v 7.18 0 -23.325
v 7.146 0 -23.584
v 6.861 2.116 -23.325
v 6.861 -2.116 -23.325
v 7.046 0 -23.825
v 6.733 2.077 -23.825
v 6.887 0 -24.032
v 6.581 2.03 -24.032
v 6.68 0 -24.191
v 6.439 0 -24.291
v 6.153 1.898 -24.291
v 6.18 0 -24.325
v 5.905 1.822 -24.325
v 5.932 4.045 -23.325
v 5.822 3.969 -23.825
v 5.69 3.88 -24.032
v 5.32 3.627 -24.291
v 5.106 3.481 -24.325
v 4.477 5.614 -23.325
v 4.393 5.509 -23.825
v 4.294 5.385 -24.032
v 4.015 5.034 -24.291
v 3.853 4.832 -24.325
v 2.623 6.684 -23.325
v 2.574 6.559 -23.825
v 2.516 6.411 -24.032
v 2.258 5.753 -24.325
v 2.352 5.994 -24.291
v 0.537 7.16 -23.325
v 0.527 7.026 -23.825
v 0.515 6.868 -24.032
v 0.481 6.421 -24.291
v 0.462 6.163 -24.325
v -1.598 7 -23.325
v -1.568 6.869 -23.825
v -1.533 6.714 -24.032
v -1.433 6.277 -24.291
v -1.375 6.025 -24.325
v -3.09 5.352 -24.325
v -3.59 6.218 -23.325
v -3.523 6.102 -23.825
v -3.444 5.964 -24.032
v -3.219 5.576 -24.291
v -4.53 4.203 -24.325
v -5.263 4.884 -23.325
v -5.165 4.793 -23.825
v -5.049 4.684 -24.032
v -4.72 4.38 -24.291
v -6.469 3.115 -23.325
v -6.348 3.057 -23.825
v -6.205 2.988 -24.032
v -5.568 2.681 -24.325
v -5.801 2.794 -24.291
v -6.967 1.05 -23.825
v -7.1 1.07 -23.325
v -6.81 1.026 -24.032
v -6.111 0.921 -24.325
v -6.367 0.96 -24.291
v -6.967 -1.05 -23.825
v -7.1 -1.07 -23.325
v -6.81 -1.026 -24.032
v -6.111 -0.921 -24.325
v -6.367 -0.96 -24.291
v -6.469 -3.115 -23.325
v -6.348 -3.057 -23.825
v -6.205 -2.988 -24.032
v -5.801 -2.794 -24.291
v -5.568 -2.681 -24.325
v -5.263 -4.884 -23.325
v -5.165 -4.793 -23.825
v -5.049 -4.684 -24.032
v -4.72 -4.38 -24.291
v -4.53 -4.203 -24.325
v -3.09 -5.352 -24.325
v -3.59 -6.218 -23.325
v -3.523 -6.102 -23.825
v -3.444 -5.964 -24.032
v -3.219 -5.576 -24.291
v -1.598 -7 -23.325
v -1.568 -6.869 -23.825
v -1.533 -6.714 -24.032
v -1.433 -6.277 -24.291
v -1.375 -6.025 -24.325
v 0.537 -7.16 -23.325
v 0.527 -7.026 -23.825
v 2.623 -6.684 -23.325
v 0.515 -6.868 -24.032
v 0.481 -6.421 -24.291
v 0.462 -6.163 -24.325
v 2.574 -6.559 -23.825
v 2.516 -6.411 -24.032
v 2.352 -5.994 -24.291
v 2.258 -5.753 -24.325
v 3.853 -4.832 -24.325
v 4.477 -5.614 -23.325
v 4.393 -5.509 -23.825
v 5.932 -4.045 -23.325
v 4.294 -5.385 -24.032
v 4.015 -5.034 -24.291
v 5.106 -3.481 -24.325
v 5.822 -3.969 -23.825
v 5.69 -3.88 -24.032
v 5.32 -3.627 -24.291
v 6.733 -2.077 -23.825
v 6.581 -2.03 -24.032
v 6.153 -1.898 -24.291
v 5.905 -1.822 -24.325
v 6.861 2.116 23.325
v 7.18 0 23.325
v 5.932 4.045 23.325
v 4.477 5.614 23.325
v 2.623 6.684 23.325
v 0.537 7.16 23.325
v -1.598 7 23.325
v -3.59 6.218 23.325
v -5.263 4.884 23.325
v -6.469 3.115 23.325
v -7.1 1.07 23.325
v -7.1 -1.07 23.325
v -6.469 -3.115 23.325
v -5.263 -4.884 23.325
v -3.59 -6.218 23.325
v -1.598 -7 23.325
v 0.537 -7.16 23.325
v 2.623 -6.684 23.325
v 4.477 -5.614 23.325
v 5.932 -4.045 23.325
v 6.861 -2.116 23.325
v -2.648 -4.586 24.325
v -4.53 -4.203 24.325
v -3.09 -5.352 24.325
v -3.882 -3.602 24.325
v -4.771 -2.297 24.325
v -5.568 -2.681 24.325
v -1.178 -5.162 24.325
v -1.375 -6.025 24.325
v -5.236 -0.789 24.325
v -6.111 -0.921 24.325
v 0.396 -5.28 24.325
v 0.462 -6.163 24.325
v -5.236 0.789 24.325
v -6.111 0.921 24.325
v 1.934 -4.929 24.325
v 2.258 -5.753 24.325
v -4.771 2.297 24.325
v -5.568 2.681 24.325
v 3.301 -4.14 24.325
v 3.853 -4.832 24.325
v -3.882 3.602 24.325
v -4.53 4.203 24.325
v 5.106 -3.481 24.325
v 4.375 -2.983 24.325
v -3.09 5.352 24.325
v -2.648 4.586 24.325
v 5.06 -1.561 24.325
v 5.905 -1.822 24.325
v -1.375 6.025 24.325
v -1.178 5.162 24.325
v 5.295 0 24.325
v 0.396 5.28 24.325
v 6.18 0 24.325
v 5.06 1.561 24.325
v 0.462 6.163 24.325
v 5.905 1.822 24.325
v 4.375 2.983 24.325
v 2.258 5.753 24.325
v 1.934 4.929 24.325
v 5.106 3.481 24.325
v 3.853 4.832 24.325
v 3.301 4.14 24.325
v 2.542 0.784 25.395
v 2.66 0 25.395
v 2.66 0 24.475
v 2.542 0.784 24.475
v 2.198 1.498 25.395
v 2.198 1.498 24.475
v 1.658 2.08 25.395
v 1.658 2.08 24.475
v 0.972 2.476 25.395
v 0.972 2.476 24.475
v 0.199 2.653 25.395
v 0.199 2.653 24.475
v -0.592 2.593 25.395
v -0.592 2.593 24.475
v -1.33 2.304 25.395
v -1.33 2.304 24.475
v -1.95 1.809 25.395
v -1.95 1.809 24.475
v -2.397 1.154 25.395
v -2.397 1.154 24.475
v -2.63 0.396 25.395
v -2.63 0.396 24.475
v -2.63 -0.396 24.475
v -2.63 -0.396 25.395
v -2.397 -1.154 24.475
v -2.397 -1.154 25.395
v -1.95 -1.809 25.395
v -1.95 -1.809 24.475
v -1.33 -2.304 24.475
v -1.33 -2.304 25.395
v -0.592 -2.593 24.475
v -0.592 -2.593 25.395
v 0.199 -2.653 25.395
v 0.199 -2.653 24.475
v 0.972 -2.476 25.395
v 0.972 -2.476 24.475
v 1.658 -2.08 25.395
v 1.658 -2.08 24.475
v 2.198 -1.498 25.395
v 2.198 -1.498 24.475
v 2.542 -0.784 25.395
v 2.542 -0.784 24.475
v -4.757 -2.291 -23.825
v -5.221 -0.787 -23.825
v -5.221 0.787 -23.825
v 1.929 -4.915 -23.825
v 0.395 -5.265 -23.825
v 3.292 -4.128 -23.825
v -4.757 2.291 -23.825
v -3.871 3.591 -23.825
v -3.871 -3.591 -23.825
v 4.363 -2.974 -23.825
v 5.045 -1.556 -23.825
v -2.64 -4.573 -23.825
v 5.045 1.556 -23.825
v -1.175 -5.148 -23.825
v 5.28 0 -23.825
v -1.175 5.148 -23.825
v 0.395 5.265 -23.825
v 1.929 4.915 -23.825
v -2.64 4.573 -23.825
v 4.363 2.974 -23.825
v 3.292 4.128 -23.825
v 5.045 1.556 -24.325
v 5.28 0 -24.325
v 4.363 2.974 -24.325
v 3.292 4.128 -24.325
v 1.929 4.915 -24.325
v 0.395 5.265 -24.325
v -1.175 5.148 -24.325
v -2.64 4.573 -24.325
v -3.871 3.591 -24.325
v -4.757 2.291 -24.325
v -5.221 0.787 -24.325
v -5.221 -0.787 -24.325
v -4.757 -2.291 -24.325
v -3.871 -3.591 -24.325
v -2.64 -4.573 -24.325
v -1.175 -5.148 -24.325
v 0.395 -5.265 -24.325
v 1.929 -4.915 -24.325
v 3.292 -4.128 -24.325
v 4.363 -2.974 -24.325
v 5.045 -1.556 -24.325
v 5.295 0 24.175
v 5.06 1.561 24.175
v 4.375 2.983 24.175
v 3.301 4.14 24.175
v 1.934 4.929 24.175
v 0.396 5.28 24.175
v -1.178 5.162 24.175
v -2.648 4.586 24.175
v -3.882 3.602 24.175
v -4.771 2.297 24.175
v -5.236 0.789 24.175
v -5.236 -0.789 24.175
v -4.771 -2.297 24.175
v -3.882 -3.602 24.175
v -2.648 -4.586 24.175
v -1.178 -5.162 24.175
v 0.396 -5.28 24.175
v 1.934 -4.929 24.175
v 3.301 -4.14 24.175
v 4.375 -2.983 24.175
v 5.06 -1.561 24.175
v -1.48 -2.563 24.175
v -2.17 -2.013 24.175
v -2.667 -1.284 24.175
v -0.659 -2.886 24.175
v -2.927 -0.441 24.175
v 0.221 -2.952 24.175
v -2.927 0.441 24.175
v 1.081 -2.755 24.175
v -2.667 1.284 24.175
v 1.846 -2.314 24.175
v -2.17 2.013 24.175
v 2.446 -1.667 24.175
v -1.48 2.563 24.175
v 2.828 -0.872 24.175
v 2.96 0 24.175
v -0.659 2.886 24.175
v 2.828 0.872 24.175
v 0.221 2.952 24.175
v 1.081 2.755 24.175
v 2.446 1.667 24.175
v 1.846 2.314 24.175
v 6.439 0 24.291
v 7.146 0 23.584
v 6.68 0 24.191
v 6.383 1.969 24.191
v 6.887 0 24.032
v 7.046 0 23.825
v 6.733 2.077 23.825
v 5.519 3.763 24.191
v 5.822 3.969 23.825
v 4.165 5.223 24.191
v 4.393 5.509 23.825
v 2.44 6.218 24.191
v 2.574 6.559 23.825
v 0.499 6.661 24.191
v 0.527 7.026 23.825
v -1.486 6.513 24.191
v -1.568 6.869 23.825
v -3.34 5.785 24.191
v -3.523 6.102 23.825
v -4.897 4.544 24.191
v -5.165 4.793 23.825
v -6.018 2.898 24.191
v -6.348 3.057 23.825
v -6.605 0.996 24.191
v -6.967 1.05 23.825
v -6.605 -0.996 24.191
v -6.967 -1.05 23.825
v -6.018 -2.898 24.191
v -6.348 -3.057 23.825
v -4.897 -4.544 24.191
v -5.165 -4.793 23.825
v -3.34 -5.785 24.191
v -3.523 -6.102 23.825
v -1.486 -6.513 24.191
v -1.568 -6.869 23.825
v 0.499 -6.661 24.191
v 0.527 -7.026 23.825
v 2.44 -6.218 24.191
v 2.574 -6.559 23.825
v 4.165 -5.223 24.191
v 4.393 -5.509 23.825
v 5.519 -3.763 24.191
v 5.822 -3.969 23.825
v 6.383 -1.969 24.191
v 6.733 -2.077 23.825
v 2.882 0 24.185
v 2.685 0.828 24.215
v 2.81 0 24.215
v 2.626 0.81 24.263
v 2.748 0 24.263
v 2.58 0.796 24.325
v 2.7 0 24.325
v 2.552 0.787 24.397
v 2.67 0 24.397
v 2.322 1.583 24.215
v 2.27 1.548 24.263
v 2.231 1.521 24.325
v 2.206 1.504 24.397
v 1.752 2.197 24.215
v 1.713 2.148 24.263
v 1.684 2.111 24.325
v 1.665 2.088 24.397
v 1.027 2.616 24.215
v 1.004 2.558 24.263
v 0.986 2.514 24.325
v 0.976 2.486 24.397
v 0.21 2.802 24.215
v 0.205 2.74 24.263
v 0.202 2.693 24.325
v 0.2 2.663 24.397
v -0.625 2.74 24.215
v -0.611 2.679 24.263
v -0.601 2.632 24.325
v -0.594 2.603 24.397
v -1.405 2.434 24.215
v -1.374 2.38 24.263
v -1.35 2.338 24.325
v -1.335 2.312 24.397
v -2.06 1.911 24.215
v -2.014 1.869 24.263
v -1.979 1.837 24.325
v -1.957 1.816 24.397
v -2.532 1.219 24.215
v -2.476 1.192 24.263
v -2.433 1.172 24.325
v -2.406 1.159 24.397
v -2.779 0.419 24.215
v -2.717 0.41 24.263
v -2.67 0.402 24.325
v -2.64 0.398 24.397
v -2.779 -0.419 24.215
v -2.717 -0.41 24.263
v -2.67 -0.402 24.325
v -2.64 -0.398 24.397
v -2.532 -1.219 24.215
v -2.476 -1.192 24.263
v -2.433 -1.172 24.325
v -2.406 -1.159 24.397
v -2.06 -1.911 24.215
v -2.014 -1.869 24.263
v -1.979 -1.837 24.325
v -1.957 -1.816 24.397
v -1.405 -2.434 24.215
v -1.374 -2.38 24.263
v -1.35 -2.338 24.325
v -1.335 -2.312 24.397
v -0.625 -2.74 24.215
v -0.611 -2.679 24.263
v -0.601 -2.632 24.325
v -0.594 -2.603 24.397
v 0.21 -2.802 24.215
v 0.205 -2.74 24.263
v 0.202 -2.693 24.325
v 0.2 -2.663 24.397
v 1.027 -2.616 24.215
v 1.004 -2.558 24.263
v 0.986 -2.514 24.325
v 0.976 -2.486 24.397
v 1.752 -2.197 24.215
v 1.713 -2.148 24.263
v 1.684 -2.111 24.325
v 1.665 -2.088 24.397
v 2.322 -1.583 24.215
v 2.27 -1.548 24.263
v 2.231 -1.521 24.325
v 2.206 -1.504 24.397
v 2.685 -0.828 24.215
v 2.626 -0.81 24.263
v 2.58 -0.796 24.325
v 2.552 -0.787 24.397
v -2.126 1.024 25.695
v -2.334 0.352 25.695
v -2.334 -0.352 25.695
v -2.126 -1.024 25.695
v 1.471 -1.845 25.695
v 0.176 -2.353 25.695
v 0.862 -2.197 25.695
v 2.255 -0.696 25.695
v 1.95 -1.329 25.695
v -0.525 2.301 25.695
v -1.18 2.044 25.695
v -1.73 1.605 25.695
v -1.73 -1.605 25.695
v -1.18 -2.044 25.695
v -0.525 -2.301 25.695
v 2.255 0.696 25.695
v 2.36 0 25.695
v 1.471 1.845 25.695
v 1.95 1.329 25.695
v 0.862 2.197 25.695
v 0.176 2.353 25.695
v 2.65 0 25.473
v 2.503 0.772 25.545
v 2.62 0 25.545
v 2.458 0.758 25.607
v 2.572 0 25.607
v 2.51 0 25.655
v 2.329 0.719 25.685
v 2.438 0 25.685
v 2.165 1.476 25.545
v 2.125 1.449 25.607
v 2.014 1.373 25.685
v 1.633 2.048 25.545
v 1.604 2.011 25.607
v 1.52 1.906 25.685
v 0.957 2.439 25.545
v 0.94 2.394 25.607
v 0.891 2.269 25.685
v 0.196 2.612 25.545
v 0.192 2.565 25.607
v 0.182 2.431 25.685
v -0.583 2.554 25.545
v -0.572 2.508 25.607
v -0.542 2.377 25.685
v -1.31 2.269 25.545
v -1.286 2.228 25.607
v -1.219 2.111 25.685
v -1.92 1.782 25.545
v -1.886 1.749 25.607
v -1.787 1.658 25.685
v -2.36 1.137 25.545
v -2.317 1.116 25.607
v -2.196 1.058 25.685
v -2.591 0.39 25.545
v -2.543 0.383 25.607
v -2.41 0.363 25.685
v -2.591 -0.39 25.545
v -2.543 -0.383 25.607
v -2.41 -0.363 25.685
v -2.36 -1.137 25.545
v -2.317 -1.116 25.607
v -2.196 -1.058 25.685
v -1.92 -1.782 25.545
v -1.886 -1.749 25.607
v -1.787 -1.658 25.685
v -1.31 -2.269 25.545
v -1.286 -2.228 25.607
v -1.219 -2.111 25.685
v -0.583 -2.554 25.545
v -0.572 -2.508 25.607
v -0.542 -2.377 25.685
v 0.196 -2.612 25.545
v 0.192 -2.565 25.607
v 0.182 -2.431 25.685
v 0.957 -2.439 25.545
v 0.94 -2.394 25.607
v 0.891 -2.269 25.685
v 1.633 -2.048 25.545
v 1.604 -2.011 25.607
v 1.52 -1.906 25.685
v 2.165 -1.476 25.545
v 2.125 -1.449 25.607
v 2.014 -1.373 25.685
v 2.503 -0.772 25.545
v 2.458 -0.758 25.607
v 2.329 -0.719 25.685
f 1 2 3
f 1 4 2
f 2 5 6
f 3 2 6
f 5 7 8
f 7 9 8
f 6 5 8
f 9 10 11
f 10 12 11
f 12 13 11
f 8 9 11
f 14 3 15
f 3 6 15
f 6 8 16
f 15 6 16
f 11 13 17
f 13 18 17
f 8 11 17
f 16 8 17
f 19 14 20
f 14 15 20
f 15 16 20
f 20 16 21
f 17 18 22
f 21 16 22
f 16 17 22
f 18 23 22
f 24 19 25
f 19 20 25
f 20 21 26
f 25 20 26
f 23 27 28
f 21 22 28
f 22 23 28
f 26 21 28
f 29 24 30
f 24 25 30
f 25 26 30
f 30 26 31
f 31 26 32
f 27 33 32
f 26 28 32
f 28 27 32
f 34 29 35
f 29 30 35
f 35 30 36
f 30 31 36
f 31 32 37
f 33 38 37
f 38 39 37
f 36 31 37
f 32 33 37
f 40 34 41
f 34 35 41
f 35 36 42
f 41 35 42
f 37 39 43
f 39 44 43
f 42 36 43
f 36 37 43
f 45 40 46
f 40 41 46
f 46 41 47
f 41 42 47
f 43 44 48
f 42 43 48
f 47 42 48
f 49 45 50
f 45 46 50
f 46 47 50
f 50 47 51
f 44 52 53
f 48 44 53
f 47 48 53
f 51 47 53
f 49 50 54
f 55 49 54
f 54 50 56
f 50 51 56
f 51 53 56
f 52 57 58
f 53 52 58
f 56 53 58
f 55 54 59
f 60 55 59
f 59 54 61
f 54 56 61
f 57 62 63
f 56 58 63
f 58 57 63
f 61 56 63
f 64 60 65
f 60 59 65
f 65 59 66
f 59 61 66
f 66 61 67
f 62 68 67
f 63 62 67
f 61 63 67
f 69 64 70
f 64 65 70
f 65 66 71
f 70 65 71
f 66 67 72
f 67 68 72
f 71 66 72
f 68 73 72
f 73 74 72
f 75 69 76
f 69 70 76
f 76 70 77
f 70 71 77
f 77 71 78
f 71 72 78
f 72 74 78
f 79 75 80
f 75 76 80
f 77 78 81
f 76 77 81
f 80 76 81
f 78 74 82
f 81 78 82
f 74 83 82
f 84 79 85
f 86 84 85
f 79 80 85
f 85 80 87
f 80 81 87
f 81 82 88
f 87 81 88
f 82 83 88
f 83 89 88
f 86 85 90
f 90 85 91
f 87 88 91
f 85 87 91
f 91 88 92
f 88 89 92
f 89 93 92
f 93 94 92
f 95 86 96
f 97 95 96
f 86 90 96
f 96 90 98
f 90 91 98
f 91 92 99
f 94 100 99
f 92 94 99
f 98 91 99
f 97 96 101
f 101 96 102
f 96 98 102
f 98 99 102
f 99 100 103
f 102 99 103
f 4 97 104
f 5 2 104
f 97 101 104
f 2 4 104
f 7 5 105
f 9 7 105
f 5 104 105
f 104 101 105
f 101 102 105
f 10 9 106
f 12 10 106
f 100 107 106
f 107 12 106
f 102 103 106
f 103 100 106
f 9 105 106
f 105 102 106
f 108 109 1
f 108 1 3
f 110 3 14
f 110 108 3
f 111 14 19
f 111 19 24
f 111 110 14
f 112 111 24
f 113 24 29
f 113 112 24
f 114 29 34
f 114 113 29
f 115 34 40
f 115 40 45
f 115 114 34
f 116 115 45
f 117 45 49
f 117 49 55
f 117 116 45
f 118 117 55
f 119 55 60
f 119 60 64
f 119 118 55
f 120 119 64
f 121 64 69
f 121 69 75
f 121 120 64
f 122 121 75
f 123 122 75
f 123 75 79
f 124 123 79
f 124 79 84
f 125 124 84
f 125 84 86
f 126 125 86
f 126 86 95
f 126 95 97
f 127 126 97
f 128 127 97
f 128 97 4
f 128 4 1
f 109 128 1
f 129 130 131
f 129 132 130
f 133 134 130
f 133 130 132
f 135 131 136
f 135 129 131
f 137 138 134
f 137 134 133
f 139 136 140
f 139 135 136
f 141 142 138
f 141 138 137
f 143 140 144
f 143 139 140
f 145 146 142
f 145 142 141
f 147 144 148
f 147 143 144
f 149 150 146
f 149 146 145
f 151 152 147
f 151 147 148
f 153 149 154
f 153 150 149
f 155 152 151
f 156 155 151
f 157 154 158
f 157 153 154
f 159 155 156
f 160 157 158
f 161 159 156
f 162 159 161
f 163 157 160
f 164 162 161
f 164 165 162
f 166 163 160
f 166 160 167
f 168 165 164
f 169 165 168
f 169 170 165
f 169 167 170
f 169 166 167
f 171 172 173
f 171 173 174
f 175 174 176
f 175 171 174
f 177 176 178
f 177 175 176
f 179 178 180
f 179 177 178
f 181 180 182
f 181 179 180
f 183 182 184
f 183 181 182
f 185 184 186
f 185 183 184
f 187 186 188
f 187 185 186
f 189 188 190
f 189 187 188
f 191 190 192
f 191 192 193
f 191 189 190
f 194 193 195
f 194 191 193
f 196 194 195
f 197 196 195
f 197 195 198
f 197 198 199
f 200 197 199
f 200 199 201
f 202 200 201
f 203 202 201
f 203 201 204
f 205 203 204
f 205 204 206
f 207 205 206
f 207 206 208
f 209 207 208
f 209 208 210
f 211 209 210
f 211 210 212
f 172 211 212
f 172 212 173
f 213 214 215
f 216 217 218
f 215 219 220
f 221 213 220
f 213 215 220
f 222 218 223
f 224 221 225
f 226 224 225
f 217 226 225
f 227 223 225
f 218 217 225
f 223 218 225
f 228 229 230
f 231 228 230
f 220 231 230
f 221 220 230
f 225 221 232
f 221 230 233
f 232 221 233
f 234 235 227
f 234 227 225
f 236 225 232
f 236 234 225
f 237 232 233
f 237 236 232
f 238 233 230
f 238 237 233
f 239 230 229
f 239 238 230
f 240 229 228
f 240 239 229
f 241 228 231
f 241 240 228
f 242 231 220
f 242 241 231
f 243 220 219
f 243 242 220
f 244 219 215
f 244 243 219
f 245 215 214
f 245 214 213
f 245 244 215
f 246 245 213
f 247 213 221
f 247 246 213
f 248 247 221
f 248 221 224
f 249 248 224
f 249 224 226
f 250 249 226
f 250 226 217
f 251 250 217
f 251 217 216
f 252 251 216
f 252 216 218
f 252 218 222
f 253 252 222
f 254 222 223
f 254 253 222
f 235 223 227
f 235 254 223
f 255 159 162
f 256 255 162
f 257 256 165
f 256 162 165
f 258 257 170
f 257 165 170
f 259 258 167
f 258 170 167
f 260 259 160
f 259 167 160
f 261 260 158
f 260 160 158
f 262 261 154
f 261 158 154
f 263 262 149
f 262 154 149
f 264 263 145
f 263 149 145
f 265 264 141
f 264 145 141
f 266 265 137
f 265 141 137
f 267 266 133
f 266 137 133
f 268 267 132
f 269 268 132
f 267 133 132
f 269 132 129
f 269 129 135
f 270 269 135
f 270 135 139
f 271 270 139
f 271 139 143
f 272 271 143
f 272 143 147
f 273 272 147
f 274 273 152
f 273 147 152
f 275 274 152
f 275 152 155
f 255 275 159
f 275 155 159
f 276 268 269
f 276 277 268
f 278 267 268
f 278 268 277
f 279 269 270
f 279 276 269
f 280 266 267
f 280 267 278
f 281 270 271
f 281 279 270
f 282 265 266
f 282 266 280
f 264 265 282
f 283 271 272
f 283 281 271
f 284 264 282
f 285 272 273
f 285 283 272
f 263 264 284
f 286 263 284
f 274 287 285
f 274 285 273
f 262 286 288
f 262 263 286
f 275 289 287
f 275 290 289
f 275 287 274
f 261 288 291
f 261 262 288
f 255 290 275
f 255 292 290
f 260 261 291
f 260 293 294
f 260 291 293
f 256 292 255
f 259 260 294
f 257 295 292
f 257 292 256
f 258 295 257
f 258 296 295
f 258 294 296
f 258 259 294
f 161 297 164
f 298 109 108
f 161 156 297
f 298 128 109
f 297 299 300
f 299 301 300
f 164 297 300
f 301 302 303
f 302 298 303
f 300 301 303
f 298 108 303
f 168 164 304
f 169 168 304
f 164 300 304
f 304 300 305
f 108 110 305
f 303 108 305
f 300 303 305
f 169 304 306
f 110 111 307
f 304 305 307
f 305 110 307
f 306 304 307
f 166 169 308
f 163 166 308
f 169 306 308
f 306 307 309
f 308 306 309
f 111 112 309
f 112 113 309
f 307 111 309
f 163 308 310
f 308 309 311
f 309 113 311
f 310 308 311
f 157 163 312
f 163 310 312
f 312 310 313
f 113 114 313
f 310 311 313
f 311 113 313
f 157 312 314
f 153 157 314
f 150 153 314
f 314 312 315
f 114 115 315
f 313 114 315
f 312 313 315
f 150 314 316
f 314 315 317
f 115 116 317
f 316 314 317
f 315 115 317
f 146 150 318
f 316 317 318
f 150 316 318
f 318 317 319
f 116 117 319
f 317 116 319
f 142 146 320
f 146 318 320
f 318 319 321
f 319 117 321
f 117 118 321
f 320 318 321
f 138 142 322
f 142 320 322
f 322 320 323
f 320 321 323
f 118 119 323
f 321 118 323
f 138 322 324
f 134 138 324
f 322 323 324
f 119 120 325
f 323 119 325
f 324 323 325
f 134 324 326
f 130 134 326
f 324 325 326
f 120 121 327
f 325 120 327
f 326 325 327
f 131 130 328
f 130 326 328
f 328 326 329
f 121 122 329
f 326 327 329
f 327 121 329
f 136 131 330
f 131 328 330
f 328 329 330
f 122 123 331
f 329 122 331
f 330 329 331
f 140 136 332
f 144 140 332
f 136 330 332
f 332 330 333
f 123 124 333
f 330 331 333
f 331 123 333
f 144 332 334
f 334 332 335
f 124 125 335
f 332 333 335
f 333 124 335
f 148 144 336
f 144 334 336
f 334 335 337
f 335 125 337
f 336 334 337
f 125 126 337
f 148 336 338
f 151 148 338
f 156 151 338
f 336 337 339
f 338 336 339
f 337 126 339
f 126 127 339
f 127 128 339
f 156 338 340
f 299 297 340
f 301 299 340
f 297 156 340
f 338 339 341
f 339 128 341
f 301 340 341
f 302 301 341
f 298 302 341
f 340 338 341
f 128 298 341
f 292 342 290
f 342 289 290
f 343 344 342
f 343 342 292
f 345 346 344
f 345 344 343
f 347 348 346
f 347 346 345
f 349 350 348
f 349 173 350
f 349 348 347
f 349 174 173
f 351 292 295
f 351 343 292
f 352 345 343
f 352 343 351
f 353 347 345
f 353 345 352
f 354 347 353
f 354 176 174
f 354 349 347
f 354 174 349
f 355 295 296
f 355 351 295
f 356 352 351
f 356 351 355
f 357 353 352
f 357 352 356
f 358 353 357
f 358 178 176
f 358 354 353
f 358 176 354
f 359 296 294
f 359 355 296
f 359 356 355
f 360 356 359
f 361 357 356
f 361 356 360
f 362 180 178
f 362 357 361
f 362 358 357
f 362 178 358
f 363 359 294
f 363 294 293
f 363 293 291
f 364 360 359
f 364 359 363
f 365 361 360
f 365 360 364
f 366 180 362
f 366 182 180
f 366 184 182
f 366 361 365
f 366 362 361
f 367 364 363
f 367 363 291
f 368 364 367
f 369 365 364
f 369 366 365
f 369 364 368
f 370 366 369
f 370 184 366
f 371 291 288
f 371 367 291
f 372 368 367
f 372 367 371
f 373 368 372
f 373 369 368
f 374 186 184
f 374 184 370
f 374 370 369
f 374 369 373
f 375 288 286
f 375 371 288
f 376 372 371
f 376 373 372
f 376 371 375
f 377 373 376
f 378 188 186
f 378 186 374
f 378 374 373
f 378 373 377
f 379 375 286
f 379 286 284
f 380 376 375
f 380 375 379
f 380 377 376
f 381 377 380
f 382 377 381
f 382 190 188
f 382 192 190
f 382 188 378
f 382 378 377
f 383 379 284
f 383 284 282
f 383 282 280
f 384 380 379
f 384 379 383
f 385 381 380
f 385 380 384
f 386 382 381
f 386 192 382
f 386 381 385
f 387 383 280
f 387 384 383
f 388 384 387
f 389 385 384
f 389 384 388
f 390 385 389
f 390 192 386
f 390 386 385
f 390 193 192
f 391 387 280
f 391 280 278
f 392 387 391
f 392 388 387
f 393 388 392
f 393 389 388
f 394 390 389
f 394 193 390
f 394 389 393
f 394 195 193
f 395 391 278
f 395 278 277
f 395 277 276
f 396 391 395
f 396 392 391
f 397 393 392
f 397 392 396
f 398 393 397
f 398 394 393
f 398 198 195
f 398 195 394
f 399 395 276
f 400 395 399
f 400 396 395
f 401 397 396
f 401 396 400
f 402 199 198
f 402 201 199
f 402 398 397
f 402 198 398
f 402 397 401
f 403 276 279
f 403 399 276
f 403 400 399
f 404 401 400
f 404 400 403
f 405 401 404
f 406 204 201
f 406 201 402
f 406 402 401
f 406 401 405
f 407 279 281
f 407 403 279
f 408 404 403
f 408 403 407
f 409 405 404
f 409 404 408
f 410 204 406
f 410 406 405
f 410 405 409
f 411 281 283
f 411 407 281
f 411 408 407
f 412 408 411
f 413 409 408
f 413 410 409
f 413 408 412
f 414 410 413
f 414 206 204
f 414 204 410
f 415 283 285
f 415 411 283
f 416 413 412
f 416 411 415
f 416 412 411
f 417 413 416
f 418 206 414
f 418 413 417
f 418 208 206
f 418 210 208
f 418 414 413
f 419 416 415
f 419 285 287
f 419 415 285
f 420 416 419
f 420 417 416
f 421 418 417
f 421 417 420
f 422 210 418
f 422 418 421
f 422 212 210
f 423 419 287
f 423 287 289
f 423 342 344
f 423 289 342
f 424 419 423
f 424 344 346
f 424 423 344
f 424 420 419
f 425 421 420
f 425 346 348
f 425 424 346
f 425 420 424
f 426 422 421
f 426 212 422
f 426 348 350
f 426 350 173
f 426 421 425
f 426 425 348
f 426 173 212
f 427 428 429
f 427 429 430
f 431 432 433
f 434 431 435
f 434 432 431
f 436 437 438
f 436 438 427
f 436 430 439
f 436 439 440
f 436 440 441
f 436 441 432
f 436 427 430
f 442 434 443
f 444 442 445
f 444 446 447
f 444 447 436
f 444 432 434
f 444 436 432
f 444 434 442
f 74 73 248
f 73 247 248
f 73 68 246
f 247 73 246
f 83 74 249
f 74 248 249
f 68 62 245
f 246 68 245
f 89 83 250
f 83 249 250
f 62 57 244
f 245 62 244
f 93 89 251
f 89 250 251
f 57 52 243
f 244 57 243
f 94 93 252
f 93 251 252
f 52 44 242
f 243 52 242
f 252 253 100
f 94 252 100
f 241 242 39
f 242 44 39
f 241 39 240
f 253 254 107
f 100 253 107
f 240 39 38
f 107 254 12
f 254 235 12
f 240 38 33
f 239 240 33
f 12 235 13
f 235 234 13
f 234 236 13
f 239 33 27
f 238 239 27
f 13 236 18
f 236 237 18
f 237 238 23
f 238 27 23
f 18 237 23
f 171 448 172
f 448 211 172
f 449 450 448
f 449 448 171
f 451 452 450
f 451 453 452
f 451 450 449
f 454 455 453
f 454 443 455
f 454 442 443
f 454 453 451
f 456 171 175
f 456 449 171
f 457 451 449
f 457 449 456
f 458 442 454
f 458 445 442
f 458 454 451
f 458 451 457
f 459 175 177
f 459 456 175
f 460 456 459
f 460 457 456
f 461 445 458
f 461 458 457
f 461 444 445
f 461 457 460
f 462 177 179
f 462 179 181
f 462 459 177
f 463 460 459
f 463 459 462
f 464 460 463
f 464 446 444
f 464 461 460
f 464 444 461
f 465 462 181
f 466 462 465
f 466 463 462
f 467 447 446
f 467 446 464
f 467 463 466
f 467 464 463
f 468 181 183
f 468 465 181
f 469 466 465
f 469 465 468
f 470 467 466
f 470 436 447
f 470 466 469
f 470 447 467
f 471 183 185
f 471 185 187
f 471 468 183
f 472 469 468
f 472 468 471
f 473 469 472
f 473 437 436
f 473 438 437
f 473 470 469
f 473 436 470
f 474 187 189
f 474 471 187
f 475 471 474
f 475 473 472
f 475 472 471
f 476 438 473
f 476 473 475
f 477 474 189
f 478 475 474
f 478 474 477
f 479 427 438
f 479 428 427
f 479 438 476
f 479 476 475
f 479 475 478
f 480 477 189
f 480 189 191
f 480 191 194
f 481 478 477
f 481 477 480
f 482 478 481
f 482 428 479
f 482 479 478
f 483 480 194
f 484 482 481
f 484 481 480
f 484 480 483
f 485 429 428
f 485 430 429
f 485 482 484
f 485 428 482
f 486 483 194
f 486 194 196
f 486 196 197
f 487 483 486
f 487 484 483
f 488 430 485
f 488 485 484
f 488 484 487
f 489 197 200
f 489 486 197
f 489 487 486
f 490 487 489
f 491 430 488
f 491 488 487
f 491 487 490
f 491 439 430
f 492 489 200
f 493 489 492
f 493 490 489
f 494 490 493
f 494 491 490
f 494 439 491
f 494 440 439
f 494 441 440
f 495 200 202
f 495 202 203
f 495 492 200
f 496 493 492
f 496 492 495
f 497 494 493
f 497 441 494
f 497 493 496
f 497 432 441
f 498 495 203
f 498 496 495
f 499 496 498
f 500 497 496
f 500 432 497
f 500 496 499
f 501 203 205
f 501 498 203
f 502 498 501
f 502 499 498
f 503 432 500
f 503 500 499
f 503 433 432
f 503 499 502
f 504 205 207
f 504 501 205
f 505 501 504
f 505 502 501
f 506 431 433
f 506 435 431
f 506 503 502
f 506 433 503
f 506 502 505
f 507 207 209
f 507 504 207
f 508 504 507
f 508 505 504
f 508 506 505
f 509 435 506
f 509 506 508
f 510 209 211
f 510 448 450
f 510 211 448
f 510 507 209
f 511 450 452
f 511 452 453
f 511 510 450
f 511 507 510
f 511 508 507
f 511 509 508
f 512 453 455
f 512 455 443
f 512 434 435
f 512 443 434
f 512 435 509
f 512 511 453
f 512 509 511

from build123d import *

# Parameters (mm, degrees)
SKETCH_R          = 7.18
PAD_DEPTH         = 24.325
SKETCH001_R       = 5.295
POCKET_DEPTH      = 0.15
SKETCH002_R       = 2.66
PAD001_DEPTH      = 1.37
PAD001_DEPTH_BACK = 1
SKETCH003_R       = 5.28
POCKET001_DEPTH   = 0.5
FILLET_R          = 1
FILLET001_R       = 0.3


with BuildPart() as part:
    # Sketch → Pad (new body, symmetric)
    with BuildSketch(Plane.XY):
        Circle(SKETCH_R)
    extrude(amount=PAD_DEPTH, both=True)

    # Sketch001 (on DatumPlane) → Pocket (cut)
    with BuildSketch(Plane.XY.offset(24.325)):
        Circle(SKETCH001_R)
    extrude(amount=-POCKET_DEPTH, mode=Mode.SUBTRACT)

    # Sketch002 (on DatumPlane) → Pad001 (join, two sides)
    with BuildSketch(Plane.XY.offset(24.325)) as pad001_sk:
        Circle(SKETCH002_R)
    extrude(amount=PAD001_DEPTH)
    extrude(pad001_sk.sketch, amount=-PAD001_DEPTH_BACK)

    # Sketch003 (on DatumPlane) → Pocket001 (cut)
    with BuildSketch(Plane.XY.offset(-24.325)):
        Circle(SKETCH003_R)
    extrude(amount=POCKET001_DEPTH, mode=Mode.SUBTRACT)

    # Fillet
    fillet_edges = [part.edges().sort_by_distance(p)[0] for p in [
        (-7.18, 0, 24.325),
        (-7.18, 0, -24.325),
    ]]
    fillet(fillet_edges, radius=FILLET_R)

    # Fillet001
    fillet001_edges = [part.edges().sort_by_distance(p)[0] for p in [
        (-2.66, 0, 25.695),
        (-2.66, 0, 24.175),
    ]]
    fillet(fillet001_edges, radius=FILLET001_R)


solid = part.part
